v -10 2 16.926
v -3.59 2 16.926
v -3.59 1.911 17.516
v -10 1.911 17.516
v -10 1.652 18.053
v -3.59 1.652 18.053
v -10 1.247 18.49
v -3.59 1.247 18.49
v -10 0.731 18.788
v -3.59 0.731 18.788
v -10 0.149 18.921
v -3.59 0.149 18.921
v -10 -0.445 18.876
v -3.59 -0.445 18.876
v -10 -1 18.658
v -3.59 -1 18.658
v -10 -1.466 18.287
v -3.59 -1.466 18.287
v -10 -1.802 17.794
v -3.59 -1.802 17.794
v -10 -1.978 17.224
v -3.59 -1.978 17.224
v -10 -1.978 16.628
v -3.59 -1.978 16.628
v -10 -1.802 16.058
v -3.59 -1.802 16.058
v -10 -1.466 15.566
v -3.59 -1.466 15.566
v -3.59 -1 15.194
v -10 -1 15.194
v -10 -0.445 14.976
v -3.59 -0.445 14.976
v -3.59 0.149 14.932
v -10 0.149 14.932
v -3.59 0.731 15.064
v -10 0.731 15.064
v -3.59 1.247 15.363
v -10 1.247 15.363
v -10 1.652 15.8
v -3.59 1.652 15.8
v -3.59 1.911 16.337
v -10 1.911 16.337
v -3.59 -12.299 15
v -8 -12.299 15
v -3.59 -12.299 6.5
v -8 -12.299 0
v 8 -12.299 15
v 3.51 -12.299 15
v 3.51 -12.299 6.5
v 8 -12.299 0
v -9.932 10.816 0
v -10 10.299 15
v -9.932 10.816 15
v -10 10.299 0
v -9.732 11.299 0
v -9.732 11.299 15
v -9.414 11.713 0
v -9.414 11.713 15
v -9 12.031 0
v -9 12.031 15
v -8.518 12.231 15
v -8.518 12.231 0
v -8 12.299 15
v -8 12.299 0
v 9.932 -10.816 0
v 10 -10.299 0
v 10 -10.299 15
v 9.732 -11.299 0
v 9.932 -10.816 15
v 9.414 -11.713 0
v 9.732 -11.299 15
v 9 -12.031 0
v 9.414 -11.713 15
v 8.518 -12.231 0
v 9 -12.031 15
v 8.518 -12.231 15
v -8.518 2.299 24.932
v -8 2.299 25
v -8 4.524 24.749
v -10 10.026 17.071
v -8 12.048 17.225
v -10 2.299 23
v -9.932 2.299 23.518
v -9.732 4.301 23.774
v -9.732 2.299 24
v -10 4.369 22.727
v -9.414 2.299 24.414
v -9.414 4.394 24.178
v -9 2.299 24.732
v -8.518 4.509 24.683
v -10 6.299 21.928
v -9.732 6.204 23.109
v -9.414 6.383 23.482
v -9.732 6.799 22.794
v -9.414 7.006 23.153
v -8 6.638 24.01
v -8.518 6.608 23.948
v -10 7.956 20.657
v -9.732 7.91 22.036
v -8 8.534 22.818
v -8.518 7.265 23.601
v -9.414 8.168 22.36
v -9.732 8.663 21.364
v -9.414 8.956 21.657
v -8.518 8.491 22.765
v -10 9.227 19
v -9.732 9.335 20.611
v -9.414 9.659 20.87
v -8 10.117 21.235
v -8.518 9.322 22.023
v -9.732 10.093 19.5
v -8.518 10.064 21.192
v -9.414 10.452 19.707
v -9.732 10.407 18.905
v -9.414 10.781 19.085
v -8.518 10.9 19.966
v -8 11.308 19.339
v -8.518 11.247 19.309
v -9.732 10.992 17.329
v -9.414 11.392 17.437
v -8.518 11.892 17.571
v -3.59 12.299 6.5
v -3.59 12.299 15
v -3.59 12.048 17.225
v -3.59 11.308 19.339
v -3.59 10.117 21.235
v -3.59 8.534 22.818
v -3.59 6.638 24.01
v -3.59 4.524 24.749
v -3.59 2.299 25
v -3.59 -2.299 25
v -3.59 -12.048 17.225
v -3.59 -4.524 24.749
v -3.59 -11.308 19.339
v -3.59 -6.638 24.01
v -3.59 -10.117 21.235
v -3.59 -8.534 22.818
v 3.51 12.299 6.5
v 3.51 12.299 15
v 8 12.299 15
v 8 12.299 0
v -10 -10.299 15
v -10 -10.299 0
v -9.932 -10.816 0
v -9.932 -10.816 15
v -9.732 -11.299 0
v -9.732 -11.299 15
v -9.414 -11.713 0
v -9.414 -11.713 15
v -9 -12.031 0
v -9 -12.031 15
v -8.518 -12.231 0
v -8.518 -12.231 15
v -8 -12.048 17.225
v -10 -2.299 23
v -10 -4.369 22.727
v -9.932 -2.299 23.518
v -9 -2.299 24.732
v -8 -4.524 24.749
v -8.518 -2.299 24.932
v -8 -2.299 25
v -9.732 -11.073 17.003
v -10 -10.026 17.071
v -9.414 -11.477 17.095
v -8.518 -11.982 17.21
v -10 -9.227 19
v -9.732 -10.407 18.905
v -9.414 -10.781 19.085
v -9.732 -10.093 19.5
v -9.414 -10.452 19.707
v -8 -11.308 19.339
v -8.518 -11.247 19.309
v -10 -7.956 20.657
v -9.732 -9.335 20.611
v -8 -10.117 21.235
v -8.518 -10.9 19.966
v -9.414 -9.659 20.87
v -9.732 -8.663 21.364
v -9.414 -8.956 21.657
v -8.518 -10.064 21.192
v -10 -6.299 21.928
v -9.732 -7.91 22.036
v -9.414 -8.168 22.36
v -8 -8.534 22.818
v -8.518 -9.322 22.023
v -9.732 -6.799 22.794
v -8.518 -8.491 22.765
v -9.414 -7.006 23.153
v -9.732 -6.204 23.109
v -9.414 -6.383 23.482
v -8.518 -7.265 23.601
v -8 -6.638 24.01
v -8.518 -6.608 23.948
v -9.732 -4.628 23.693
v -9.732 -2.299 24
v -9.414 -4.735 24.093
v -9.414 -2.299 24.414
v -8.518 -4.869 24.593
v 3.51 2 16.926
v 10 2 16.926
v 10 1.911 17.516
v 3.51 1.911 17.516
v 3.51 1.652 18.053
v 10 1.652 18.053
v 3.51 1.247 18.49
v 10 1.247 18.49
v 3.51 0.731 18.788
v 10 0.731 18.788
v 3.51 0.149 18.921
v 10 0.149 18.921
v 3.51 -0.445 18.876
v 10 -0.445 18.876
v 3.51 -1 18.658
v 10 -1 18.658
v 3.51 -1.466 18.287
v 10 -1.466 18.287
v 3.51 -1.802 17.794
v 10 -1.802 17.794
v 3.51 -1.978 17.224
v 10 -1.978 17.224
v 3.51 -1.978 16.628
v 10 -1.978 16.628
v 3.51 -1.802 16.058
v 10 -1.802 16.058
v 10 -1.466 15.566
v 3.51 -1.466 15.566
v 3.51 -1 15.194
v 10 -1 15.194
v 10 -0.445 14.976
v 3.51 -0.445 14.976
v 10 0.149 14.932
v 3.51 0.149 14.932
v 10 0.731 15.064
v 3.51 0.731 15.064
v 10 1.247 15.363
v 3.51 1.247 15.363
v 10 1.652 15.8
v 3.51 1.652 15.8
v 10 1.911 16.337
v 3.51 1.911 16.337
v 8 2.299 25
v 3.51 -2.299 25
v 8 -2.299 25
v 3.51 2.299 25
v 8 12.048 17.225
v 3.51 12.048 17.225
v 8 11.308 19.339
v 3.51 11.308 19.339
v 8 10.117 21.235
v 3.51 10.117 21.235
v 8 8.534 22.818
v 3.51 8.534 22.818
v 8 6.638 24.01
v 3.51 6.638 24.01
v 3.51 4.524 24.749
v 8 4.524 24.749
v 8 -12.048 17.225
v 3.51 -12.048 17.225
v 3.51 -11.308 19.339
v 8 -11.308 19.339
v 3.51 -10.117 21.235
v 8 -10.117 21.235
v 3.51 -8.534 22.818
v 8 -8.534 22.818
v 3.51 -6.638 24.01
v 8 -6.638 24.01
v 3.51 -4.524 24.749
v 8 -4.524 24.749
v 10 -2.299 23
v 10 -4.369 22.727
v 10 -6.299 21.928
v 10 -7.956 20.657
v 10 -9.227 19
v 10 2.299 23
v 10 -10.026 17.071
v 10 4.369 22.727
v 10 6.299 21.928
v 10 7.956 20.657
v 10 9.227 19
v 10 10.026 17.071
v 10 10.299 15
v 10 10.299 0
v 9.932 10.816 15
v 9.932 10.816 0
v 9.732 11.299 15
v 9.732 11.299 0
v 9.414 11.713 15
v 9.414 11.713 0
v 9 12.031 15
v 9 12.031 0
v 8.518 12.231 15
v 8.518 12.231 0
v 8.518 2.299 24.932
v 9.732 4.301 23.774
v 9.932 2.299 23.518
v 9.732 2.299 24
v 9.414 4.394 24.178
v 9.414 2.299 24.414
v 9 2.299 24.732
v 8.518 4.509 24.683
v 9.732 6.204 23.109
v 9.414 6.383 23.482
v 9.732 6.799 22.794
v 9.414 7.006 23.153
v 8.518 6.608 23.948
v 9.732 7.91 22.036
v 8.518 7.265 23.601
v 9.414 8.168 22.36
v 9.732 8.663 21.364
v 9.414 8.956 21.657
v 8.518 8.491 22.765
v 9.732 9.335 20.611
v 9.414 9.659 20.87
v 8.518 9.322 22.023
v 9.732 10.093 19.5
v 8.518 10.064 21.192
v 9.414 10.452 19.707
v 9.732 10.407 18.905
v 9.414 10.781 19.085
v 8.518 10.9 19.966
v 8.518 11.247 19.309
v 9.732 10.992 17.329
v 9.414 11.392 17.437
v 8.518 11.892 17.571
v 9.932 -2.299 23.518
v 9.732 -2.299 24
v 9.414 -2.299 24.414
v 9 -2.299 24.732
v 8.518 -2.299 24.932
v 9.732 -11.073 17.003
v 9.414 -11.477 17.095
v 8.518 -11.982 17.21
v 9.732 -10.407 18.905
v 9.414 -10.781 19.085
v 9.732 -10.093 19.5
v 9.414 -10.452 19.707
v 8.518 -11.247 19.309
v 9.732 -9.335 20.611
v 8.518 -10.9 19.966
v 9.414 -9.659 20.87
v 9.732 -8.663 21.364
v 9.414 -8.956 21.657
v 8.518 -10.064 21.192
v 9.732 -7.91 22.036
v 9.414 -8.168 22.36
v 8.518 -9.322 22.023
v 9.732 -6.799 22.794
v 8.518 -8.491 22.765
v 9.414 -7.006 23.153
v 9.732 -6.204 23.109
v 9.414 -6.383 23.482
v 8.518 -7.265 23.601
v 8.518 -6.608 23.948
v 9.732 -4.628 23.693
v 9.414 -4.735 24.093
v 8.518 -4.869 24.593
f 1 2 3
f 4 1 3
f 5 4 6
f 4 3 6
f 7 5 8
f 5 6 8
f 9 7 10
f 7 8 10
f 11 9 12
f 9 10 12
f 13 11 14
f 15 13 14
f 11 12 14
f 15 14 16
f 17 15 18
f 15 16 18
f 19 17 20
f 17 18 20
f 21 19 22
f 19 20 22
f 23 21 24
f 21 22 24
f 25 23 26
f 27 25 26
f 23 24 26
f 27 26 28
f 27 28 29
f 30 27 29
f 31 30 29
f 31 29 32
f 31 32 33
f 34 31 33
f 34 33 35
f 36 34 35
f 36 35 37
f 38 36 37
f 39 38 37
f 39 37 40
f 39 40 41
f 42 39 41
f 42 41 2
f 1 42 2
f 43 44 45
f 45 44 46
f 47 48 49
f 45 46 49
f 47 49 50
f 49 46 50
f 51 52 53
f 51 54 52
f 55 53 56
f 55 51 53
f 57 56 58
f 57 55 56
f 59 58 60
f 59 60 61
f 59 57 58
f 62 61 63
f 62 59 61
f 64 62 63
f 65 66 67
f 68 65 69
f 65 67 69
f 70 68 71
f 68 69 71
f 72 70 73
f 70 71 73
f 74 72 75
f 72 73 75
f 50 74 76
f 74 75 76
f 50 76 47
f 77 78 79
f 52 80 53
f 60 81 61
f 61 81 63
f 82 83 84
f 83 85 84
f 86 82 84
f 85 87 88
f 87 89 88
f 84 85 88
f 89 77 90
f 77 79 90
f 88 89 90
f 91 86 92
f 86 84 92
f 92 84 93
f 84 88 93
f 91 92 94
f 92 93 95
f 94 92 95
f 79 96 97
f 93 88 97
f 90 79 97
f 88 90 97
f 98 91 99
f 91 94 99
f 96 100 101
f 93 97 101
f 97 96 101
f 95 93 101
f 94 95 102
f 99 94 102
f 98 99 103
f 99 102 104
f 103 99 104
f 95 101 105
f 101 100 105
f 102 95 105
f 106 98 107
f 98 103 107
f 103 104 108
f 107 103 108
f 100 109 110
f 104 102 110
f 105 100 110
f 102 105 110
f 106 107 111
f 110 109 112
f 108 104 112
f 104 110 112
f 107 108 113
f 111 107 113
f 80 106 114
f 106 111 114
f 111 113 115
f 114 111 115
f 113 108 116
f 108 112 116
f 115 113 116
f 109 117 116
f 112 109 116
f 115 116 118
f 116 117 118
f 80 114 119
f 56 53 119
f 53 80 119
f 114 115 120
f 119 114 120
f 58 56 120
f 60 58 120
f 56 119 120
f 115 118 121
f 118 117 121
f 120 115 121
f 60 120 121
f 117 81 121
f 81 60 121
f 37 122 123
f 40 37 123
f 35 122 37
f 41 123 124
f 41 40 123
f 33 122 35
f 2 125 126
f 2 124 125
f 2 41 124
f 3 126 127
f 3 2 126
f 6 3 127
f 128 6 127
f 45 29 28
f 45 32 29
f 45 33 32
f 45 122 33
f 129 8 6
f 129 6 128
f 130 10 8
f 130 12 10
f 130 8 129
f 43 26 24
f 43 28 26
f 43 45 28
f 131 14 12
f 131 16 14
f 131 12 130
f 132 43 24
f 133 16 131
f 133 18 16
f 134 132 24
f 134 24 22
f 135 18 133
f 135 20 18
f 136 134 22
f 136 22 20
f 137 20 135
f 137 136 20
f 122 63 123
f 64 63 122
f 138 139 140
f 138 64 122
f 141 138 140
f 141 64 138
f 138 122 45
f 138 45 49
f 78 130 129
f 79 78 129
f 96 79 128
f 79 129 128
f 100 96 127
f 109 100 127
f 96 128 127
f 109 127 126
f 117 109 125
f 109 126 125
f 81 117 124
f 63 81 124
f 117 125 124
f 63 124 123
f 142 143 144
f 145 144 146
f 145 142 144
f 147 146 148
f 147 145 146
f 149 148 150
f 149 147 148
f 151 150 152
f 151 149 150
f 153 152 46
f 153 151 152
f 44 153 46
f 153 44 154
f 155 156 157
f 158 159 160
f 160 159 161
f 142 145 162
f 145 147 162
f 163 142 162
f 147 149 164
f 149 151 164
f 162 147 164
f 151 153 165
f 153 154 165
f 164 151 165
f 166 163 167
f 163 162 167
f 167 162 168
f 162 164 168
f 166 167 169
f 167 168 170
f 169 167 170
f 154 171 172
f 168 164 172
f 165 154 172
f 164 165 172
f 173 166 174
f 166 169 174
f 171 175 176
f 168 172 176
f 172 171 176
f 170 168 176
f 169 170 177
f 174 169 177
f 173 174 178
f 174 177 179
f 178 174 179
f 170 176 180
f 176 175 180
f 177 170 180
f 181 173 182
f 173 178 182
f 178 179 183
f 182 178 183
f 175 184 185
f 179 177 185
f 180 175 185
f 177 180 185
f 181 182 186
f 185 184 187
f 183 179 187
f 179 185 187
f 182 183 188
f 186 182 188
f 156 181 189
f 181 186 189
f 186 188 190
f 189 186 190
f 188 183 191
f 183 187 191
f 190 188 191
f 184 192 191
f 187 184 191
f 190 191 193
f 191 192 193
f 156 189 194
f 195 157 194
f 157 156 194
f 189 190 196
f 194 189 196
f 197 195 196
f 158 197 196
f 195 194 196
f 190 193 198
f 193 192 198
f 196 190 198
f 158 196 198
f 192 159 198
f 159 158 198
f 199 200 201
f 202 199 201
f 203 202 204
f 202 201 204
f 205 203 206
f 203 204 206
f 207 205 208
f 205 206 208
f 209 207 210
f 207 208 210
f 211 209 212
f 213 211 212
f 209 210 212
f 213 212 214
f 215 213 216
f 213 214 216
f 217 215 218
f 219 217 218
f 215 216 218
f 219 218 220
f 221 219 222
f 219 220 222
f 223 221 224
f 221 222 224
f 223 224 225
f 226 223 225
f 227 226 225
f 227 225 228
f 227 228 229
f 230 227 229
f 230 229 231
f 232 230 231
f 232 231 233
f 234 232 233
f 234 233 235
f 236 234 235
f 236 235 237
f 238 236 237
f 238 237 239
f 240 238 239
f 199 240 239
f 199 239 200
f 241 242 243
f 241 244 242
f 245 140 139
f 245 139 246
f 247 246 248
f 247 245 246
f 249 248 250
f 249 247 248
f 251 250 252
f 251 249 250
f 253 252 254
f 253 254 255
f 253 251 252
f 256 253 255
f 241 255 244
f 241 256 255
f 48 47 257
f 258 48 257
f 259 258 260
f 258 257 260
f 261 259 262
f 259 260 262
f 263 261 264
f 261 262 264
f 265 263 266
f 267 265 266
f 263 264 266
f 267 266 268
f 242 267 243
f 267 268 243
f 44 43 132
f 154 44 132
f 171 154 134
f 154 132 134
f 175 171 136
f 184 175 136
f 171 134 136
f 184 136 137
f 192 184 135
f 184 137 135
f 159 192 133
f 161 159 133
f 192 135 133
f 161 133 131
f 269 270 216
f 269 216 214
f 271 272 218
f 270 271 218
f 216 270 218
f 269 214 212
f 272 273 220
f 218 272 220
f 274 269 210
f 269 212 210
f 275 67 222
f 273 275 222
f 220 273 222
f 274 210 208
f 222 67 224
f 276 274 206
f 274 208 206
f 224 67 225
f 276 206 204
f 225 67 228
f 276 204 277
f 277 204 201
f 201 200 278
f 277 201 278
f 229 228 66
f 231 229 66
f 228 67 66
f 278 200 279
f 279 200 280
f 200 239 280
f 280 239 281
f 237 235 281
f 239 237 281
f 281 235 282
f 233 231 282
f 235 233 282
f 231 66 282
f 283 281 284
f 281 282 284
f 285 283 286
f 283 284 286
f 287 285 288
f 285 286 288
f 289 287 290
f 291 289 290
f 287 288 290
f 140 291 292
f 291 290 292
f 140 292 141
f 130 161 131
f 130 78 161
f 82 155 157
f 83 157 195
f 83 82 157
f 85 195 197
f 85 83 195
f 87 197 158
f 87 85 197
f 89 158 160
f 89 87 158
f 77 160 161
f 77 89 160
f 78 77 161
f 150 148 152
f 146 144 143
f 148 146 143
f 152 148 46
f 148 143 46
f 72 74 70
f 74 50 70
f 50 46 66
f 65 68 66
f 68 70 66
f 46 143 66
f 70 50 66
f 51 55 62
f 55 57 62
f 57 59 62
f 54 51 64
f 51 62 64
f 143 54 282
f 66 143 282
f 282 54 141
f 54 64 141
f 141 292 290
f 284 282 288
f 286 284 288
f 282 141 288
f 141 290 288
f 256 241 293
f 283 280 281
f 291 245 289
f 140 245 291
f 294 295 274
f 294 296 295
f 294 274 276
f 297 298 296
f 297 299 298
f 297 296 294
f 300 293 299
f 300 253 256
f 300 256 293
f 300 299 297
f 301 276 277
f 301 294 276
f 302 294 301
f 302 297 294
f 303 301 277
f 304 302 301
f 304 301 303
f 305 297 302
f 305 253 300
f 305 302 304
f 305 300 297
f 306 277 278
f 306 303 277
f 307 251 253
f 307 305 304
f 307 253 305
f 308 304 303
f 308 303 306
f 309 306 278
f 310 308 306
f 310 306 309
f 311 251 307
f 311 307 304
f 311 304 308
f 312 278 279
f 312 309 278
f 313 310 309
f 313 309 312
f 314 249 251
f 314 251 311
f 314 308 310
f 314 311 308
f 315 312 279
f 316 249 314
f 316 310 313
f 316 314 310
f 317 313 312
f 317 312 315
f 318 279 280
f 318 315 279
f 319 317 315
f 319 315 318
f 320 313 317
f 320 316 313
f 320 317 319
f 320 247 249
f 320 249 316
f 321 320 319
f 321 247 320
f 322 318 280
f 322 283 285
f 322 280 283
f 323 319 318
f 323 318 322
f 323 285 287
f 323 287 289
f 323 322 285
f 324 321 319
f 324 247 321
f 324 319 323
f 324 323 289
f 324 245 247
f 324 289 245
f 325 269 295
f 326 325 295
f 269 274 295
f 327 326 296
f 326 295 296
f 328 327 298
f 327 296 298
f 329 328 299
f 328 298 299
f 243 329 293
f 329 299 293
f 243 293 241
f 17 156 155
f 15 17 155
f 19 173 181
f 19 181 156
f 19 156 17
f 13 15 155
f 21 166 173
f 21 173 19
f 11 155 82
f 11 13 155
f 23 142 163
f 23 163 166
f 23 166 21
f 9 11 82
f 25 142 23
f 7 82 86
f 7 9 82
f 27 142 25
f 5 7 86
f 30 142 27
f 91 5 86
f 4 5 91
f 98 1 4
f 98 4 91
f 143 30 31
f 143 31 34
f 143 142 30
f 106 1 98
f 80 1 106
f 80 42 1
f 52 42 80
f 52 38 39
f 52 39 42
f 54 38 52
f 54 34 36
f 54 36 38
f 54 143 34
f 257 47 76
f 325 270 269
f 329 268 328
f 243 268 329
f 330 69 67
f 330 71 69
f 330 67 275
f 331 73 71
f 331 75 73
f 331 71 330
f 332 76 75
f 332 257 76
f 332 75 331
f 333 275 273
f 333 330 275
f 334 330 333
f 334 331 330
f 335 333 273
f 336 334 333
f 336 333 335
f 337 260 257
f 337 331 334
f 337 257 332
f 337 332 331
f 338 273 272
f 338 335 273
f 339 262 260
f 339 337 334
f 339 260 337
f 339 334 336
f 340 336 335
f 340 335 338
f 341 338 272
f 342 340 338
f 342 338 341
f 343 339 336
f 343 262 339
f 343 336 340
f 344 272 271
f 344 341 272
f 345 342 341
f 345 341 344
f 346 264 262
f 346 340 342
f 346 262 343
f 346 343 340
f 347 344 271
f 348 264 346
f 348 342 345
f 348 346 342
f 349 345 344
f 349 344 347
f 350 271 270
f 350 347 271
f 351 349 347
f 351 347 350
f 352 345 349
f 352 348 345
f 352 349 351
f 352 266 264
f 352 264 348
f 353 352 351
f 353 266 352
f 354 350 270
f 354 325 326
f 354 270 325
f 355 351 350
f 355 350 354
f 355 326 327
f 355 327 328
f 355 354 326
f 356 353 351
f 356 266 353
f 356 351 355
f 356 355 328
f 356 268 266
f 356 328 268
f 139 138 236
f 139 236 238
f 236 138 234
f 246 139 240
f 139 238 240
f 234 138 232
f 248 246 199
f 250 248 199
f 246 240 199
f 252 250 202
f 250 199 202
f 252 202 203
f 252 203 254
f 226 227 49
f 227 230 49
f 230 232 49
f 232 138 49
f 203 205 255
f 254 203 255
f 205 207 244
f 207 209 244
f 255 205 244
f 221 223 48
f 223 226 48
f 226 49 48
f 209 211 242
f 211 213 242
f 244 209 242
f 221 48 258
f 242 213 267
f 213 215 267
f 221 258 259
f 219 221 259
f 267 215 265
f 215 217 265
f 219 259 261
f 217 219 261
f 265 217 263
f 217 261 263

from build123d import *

# Parameters (mm, degrees)
F0_W     = 20
F0_H     = 24.5975396182
F1_DEPTH = 25
F2_W     = 7.1
F2_H     = 19.9254054902
F3_DEPTH = 12.5
F4_R     = 2
F5_DEPTH = 20.001
F6_R     = 10
F7_R     = 2
F8_R     = 2


with BuildPart() as f1:
    # F0 (on Top) → F1 (new body)
    with BuildSketch(Plane.XY):
        Rectangle(F0_W, F0_H)
    extrude(amount=F1_DEPTH)

    # F2 (on Front) → F3 (cut, symmetric)
    with BuildSketch(Plane.XZ):
        with Locations((-0.04, 16.4627027451)):
            Rectangle(F2_W, F2_H)
    extrude(amount=F3_DEPTH, both=True, mode=Mode.SUBTRACT)

    # F4 (on face) → F5 (cut, through all)
    with BuildSketch(Plane.YZ.offset(10)):
        with Locations((0, 16.9262466765)):
            Circle(F4_R)
    extrude(amount=-F5_DEPTH, mode=Mode.SUBTRACT)

    # F6
    f6_edges = [f1.edges().sort_by_distance(p)[0] for p in [
        (-6.795, -12.29877, 25),
        (6.755, -12.29877, 25),
        (6.755, 12.29877, 25),
        (-6.795, 12.29877, 25),
    ]]
    fillet(f6_edges, radius=F6_R)

    # F7
    f7_edges = [f1.edges().sort_by_distance(p)[0] for p in [
        (10, -9.369838, 22.071068),
        (10, 0, 25),
    ]]
    fillet(f7_edges, radius=F7_R)

    # F8
    f8_edges = [f1.edges().sort_by_distance(p)[0] for p in [
        (-10, 9.369838, 22.071068),
    ]]
    fillet(f8_edges, radius=F8_R)


solid = f1.part
